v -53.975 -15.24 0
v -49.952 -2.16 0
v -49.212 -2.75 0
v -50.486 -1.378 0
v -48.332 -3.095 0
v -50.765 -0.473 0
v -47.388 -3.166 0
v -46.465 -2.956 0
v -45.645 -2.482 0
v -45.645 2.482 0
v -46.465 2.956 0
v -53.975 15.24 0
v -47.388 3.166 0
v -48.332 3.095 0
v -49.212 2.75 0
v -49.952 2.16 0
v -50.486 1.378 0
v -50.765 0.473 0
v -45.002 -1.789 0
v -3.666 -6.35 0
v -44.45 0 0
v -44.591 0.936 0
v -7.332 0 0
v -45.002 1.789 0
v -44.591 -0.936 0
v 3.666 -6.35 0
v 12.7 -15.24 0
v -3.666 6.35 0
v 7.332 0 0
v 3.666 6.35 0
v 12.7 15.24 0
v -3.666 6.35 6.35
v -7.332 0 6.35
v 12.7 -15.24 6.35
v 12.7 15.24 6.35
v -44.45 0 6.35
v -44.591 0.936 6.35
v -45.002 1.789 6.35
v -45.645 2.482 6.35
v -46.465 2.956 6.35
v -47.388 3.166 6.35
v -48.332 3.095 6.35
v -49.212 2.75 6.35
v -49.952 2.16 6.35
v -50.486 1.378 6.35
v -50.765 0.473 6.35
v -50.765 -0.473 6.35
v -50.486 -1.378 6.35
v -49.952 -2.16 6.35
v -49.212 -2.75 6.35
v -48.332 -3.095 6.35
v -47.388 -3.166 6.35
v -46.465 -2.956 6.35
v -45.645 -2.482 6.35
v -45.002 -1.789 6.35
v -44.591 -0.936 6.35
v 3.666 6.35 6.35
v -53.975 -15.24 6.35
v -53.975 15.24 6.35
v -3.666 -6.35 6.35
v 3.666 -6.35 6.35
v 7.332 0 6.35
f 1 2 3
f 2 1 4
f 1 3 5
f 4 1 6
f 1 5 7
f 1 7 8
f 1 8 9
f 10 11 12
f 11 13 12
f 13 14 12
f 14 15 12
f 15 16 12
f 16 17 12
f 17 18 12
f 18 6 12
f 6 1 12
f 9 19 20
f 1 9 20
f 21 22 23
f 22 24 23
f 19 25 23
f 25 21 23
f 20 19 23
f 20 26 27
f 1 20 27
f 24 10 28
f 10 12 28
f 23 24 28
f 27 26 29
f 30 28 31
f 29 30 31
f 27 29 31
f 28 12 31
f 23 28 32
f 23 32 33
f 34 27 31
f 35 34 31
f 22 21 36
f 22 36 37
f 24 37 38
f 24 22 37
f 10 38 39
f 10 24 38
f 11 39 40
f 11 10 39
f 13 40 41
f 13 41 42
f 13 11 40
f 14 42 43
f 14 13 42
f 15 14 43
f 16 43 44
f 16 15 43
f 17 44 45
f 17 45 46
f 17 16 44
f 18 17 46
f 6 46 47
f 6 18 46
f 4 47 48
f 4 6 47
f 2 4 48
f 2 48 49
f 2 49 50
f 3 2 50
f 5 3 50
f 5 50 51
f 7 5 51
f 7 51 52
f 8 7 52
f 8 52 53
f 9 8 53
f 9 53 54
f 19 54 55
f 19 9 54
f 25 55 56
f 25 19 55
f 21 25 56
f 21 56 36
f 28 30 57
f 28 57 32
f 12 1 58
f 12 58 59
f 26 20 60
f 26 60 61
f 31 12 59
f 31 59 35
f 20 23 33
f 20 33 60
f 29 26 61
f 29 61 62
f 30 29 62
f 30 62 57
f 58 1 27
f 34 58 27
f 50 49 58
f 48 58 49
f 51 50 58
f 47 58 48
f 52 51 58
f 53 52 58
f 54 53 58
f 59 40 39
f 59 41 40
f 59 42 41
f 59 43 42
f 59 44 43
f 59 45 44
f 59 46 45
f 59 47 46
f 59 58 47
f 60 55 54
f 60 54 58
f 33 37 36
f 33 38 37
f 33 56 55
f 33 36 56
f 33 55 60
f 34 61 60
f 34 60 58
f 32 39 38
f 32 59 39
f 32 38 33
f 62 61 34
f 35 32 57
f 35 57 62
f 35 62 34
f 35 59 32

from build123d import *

# Parameters (mm, degrees)
SKETCH2_W           = 66.675
SKETCH2_H           = 30.48
SKETCH2_R           = 3.175
BOSS_EXTRUDE2_DEPTH = 6.35


with BuildPart() as part:
    # Sketch2 → Boss-Extrude2 (new body)
    with BuildSketch(Plane.XY):
        with Locations((-20.6375, 0)):
            Rectangle(SKETCH2_W, SKETCH2_H)
        with Locations((-47.625, 0)):
            Circle(SKETCH2_R, mode=Mode.SUBTRACT)
        Polygon((3.666174209, 6.35), (-3.666174209, 6.35), (-7.332348419, 0), (-3.666174209, -6.35), (3.666174209, -6.35), (7.332348419, 0), align=None, mode=Mode.SUBTRACT)
    extrude(amount=BOSS_EXTRUDE2_DEPTH)


solid = part.part
